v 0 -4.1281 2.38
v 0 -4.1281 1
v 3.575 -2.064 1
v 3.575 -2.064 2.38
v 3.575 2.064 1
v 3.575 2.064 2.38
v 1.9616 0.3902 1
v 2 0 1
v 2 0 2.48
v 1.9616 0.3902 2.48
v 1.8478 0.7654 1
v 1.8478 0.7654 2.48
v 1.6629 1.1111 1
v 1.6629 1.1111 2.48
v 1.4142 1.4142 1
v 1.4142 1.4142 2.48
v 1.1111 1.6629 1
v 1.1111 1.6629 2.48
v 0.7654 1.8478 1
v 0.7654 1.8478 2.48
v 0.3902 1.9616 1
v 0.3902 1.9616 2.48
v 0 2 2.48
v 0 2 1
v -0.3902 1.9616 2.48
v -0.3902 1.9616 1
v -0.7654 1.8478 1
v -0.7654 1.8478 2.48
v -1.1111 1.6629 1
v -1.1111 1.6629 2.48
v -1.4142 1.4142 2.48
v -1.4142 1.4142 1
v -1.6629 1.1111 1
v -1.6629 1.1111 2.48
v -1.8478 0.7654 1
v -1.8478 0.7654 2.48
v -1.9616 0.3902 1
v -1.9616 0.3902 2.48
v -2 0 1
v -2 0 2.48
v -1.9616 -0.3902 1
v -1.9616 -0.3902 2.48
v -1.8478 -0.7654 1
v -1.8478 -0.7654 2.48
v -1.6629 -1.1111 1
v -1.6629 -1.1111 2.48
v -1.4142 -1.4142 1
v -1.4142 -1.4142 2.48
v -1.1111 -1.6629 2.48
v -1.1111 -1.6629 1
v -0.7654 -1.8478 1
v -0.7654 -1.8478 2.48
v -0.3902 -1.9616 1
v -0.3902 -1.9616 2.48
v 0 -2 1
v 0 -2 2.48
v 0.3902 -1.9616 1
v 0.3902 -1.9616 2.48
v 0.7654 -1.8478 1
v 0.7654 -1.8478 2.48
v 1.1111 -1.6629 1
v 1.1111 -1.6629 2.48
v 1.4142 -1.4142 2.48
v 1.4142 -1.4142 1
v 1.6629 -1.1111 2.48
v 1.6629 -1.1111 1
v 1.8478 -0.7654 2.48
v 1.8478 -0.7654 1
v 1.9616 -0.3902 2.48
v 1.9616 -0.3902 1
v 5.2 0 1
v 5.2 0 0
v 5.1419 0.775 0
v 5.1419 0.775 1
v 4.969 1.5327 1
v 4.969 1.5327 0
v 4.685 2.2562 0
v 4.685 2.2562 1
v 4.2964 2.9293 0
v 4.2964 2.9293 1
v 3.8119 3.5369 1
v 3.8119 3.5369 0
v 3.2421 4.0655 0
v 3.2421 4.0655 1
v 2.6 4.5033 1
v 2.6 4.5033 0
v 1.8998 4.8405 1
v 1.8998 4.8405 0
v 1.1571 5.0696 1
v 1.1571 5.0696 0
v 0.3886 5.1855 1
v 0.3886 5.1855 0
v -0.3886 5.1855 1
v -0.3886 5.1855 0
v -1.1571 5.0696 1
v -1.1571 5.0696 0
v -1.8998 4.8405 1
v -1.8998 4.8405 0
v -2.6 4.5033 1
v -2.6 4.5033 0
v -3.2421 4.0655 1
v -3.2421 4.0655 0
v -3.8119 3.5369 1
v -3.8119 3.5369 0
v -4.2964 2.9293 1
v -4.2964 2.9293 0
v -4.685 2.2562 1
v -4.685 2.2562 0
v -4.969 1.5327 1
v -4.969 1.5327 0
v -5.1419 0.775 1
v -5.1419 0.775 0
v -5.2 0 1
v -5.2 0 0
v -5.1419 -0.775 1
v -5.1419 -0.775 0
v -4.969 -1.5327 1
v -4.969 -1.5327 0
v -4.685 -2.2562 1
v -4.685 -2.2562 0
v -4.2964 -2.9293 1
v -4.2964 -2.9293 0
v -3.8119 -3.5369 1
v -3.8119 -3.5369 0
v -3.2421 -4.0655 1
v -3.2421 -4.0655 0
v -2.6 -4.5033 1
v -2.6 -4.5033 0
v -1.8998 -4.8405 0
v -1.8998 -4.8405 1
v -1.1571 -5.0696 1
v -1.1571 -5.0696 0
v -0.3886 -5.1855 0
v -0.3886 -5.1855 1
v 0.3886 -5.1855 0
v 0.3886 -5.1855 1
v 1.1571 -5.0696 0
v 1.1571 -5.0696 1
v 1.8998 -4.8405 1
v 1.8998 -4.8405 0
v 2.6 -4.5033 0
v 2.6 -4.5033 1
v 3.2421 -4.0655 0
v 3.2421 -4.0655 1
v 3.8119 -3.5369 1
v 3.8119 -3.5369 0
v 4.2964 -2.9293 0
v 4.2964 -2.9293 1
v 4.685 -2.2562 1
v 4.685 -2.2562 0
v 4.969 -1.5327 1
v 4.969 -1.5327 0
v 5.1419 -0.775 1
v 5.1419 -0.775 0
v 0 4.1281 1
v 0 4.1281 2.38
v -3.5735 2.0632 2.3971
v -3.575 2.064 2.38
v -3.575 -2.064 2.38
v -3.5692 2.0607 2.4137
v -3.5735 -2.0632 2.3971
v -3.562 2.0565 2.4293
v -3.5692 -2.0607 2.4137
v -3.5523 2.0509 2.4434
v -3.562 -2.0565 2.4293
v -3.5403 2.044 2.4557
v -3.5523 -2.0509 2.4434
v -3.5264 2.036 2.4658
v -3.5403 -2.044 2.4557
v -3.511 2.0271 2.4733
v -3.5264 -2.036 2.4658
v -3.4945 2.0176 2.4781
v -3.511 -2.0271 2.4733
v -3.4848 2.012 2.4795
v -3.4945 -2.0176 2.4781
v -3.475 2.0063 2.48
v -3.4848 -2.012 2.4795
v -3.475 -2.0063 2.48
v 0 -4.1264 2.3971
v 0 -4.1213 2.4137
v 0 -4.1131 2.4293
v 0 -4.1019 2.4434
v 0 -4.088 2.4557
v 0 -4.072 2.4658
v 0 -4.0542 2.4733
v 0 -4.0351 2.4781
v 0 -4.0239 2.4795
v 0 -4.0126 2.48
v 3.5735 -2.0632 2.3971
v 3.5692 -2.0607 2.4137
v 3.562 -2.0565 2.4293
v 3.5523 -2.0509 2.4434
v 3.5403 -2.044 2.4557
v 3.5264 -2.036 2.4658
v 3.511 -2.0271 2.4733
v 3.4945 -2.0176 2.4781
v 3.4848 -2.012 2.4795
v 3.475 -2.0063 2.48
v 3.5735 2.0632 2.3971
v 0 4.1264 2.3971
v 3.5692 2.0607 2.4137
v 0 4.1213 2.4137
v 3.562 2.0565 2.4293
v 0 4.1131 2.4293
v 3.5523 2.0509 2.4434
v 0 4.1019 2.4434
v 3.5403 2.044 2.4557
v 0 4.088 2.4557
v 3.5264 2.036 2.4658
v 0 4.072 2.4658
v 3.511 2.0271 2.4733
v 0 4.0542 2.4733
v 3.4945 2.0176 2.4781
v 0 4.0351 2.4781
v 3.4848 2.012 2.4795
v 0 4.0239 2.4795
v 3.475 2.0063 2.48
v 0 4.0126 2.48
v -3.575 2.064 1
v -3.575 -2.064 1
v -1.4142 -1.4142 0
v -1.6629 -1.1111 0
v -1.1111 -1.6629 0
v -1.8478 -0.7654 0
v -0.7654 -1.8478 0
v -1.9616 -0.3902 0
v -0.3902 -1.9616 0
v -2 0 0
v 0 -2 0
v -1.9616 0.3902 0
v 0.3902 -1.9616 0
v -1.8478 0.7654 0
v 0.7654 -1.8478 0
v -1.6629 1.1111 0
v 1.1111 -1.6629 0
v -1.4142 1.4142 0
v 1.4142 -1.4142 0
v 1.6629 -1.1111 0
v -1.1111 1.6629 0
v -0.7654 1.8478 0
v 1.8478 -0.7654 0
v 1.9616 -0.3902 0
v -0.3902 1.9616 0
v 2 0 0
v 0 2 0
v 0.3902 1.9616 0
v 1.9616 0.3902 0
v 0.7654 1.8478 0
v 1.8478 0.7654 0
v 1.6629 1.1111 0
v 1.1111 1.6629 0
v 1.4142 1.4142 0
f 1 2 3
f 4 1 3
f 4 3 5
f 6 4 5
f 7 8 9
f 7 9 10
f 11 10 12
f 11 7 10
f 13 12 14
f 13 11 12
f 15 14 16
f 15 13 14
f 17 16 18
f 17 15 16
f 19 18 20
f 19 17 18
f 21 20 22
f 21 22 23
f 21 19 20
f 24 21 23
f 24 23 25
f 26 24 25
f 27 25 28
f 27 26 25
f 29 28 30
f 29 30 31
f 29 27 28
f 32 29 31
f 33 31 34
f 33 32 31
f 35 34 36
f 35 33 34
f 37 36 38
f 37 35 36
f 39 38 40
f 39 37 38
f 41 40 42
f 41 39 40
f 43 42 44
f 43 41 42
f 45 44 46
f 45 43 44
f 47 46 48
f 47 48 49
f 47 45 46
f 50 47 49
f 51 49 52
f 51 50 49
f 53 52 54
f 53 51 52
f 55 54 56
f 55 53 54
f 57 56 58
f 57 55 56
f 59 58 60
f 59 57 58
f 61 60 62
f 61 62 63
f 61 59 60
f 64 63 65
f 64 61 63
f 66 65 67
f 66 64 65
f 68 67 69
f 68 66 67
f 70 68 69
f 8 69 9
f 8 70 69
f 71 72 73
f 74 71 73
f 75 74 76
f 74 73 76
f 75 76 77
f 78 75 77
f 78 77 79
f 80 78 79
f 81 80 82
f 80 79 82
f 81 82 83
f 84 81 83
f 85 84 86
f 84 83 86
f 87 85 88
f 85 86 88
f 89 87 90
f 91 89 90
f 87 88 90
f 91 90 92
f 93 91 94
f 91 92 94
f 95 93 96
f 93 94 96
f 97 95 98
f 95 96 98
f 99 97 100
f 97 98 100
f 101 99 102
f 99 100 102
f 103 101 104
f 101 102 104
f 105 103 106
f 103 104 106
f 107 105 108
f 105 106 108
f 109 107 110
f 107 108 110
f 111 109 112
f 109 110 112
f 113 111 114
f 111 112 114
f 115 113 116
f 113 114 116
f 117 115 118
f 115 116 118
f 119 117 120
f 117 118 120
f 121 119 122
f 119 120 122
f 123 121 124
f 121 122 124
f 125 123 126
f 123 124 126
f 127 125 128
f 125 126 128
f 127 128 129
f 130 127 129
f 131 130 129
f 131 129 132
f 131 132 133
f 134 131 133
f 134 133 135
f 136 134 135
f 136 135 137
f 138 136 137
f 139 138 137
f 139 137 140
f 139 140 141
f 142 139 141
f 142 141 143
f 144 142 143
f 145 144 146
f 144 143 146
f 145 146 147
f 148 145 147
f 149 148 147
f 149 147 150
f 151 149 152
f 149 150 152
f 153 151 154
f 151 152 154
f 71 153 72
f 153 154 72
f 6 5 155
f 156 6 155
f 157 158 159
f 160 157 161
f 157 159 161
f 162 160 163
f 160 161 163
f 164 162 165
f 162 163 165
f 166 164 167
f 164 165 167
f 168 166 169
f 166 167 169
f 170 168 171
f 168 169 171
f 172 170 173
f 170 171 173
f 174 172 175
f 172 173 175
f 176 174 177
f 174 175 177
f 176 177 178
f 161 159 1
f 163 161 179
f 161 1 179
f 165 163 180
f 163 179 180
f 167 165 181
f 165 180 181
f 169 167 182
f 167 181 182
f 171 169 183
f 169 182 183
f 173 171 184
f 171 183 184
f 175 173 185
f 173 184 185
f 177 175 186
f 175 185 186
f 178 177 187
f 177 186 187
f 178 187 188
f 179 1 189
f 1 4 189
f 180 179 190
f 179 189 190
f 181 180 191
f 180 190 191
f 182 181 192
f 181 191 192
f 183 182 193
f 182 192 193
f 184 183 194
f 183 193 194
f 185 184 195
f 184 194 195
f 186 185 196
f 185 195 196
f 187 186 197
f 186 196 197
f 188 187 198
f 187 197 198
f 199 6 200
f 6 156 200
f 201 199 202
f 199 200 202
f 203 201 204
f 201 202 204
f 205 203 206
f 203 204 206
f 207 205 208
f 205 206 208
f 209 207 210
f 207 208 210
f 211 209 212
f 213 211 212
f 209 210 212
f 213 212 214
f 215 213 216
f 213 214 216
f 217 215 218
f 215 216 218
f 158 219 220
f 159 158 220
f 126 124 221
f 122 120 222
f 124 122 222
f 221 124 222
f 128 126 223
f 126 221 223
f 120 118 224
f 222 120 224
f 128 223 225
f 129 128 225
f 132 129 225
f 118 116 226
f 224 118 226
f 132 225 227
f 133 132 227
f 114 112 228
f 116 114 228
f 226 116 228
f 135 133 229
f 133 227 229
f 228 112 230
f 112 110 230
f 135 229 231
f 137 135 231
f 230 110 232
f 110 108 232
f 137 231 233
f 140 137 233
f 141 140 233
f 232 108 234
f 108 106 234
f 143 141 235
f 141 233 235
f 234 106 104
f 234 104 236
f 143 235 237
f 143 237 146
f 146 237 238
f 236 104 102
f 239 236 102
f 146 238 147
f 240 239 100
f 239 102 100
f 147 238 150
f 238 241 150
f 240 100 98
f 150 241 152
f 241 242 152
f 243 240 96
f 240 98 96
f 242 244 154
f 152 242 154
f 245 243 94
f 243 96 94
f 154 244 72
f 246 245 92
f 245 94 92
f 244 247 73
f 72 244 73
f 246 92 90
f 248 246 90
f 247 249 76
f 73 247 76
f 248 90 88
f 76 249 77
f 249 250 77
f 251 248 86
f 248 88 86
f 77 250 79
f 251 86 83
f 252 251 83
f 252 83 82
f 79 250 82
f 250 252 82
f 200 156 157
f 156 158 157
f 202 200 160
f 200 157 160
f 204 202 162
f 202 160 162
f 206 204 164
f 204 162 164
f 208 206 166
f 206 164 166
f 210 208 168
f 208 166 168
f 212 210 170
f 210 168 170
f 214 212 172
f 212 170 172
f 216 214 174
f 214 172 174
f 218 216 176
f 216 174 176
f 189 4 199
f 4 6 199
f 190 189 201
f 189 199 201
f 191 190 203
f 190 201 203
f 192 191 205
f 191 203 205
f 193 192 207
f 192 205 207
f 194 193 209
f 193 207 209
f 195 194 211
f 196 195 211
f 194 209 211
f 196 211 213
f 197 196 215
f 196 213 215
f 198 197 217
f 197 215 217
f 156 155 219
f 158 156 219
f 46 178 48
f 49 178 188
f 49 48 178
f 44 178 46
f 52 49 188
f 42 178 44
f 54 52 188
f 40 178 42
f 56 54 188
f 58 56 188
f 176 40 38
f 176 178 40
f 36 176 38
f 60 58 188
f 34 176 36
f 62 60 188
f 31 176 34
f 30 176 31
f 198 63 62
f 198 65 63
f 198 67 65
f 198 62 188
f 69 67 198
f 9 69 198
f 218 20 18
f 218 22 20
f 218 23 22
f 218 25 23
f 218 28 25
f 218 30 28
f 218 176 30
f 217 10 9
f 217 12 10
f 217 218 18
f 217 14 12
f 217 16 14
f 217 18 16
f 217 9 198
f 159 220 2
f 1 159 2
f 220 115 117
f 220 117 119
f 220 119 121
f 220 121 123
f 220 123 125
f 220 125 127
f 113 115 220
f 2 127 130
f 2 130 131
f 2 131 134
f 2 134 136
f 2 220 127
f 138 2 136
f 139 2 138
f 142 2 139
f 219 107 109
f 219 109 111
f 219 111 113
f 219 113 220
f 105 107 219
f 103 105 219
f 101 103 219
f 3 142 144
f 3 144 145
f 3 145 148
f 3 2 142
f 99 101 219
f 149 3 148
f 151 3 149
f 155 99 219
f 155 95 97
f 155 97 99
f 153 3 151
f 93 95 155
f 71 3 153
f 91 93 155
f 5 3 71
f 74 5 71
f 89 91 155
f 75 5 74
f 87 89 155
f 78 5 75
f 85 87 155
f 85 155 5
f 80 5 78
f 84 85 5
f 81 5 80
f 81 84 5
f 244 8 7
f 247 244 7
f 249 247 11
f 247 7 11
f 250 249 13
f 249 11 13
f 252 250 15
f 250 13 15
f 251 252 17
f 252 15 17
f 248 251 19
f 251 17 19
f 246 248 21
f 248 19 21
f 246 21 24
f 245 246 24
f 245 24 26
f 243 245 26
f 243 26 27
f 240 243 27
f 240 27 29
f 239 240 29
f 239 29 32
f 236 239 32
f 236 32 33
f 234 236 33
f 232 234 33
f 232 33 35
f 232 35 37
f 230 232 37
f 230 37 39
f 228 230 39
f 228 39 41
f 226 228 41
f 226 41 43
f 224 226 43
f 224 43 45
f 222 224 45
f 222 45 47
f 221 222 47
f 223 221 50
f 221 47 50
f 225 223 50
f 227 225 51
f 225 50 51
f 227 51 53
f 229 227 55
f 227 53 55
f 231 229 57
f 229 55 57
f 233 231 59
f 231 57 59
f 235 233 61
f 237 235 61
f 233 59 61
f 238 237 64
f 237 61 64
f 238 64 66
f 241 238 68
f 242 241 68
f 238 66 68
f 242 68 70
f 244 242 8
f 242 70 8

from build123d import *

# Parameters (mm, degrees)
F0_R          = 5.2
F1_DEPTH      = 1
F2_R          = 2
F3_DEPTH      = 1.48
F4_DEPTH      = 25
F4_DEPTH_BACK = 25
F5_R          = 0.1


with BuildPart() as f1:
    # F0 (on Top) → F1 (new body)
    with BuildSketch(Plane.XY):
        Circle(F0_R)
    extrude(amount=F1_DEPTH)

    # F2 (on face) → F3 (join)
    with BuildSketch(Plane.XY.offset(1)):
        Polygon((3.575, -2.064027), (3.575, 2.064027), (0, 4.128054), (-3.575, 2.064027), (-3.575, -2.064027), (0, -4.128054), align=None)
        Circle(F2_R, mode=Mode.SUBTRACT)
    extrude(amount=F3_DEPTH)

    # F2 (on face) → F4 (cut, two sides)
    with BuildSketch(Plane.XY.offset(1)) as f4_sk:
        Circle(F2_R)
    extrude(amount=-F4_DEPTH, mode=Mode.SUBTRACT)
    extrude(f4_sk.sketch, amount=-F4_DEPTH_BACK, mode=Mode.SUBTRACT)

    # F5
    f5_edges = [f1.edges().sort_by_distance(p)[0] for p in [
        (1.7875, -3.096041, 2.48),
        (3.575, 0, 2.48),
        (-1.7875, -3.096041, 2.48),
        (-3.575, 0, 2.48),
        (-1.7875, 3.096041, 2.48),
        (1.7875, 3.096041, 2.48),
    ]]
    fillet(f5_edges, radius=F5_R)


solid = f1.part
